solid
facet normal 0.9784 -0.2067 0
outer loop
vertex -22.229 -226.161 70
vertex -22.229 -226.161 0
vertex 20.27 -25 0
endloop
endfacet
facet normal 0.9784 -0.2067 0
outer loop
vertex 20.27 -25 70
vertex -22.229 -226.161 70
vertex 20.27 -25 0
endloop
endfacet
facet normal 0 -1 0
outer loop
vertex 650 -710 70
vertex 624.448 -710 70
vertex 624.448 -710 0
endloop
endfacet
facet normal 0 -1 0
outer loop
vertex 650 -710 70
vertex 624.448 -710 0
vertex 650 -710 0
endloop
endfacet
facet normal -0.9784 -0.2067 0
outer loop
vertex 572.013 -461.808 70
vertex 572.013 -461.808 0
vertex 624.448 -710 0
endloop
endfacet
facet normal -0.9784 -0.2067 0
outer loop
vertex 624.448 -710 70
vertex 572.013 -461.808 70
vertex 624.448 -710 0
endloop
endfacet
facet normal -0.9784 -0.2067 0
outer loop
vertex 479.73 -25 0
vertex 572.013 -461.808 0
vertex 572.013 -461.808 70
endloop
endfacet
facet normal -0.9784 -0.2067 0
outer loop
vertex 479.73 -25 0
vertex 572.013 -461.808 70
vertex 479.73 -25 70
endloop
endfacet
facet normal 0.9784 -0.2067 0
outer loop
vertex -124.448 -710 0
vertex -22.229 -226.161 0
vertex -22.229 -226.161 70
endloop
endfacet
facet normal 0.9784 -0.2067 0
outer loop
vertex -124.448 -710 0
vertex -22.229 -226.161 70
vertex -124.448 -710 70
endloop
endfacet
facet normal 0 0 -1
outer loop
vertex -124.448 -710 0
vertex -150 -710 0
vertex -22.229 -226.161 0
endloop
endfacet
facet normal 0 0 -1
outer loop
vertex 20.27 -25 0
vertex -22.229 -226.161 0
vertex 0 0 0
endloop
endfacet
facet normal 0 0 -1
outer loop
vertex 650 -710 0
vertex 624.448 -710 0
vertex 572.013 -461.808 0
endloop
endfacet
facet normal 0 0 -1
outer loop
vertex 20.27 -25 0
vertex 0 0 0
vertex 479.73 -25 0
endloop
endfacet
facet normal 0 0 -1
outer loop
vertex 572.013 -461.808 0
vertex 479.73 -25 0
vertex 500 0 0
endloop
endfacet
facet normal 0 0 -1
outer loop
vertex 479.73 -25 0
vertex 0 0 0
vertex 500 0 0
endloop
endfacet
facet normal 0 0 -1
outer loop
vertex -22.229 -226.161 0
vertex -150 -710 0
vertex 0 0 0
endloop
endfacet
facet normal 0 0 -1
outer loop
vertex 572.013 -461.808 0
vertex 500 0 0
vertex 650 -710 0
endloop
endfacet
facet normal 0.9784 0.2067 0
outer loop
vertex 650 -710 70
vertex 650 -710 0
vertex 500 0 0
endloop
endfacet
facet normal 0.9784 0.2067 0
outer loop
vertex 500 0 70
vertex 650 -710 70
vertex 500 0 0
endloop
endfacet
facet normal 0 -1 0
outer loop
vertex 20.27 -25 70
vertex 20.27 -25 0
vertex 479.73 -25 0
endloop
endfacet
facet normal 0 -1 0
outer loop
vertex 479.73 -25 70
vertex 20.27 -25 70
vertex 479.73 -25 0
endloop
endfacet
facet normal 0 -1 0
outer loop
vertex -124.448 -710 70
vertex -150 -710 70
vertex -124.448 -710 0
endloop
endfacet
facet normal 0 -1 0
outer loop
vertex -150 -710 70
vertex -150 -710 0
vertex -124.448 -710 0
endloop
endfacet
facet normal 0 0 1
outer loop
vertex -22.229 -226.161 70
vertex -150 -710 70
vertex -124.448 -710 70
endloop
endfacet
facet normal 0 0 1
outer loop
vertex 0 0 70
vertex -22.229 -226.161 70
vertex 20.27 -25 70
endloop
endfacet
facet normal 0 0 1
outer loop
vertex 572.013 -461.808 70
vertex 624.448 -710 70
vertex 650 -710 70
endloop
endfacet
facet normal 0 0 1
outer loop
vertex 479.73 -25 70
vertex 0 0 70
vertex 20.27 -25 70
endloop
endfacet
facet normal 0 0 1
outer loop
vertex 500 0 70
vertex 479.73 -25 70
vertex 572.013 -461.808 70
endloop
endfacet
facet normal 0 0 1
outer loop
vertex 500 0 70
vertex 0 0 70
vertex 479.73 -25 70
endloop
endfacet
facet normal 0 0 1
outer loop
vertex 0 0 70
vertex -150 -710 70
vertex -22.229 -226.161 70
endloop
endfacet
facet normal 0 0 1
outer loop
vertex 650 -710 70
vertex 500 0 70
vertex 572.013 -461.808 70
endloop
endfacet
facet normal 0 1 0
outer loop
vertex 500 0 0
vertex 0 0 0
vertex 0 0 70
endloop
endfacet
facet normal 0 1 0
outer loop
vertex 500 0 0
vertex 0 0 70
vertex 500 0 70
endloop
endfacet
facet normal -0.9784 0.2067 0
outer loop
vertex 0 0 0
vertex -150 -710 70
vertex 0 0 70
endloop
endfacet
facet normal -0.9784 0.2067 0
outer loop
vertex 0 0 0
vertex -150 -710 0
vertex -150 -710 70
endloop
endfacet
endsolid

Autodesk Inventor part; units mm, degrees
ref_plane "YZ Plane" through (0, 0, 0) normal (1, 0, 0) x (0, 1, 0)
ref_plane "XZ Plane" through (0, 0, 0) normal (0, 1, 0) x (-1, 0, 0)
ref_plane "XY Plane" through (0, 0, 0) normal (0, 0, 1) x (1, 0, 0)
sketch "Sketch1" plane through (0, 0, 0) normal (1, 0, 0) x (0, 1, 0)
  point P0 (0, 0)
sketch "Sketch2" plane through (0, 0, 0) normal (0, 0, 1) x (1, 0, 0)
  line L0 (0, 0) -> (500, 0)
  line L1 (650, -710) -> (500, 0)
  line L2 (-150, -710) -> (0, 0)
  line L3 (-22.2287, -226.1612) -> (20.2701, -25)
  line L4 (-22.2287, -226.1612) -> (-124.4482, -710)
  line L5 (572.0133, -461.8084) -> (479.7299, -25)
  line L6 (572.0133, -461.8084) -> (624.4482, -710)
  line L7 (20.2701, -25) -> (479.7299, -25)
  line L8 (-150, -710) -> (-124.4482, -710)
  line L9 (624.4482, -710) -> (650, -710)
  dimension "d0" = 500
sketch "Sketch3" plane through (0, 0, 0) normal (0, 0, 1) x (1, 0, 0)
  point P0 (0, 0)
extrude "Extrusion1" add sketch "Sketch2" along normal blind 70
properties part number "leg" material "Steel, Galvanized"
